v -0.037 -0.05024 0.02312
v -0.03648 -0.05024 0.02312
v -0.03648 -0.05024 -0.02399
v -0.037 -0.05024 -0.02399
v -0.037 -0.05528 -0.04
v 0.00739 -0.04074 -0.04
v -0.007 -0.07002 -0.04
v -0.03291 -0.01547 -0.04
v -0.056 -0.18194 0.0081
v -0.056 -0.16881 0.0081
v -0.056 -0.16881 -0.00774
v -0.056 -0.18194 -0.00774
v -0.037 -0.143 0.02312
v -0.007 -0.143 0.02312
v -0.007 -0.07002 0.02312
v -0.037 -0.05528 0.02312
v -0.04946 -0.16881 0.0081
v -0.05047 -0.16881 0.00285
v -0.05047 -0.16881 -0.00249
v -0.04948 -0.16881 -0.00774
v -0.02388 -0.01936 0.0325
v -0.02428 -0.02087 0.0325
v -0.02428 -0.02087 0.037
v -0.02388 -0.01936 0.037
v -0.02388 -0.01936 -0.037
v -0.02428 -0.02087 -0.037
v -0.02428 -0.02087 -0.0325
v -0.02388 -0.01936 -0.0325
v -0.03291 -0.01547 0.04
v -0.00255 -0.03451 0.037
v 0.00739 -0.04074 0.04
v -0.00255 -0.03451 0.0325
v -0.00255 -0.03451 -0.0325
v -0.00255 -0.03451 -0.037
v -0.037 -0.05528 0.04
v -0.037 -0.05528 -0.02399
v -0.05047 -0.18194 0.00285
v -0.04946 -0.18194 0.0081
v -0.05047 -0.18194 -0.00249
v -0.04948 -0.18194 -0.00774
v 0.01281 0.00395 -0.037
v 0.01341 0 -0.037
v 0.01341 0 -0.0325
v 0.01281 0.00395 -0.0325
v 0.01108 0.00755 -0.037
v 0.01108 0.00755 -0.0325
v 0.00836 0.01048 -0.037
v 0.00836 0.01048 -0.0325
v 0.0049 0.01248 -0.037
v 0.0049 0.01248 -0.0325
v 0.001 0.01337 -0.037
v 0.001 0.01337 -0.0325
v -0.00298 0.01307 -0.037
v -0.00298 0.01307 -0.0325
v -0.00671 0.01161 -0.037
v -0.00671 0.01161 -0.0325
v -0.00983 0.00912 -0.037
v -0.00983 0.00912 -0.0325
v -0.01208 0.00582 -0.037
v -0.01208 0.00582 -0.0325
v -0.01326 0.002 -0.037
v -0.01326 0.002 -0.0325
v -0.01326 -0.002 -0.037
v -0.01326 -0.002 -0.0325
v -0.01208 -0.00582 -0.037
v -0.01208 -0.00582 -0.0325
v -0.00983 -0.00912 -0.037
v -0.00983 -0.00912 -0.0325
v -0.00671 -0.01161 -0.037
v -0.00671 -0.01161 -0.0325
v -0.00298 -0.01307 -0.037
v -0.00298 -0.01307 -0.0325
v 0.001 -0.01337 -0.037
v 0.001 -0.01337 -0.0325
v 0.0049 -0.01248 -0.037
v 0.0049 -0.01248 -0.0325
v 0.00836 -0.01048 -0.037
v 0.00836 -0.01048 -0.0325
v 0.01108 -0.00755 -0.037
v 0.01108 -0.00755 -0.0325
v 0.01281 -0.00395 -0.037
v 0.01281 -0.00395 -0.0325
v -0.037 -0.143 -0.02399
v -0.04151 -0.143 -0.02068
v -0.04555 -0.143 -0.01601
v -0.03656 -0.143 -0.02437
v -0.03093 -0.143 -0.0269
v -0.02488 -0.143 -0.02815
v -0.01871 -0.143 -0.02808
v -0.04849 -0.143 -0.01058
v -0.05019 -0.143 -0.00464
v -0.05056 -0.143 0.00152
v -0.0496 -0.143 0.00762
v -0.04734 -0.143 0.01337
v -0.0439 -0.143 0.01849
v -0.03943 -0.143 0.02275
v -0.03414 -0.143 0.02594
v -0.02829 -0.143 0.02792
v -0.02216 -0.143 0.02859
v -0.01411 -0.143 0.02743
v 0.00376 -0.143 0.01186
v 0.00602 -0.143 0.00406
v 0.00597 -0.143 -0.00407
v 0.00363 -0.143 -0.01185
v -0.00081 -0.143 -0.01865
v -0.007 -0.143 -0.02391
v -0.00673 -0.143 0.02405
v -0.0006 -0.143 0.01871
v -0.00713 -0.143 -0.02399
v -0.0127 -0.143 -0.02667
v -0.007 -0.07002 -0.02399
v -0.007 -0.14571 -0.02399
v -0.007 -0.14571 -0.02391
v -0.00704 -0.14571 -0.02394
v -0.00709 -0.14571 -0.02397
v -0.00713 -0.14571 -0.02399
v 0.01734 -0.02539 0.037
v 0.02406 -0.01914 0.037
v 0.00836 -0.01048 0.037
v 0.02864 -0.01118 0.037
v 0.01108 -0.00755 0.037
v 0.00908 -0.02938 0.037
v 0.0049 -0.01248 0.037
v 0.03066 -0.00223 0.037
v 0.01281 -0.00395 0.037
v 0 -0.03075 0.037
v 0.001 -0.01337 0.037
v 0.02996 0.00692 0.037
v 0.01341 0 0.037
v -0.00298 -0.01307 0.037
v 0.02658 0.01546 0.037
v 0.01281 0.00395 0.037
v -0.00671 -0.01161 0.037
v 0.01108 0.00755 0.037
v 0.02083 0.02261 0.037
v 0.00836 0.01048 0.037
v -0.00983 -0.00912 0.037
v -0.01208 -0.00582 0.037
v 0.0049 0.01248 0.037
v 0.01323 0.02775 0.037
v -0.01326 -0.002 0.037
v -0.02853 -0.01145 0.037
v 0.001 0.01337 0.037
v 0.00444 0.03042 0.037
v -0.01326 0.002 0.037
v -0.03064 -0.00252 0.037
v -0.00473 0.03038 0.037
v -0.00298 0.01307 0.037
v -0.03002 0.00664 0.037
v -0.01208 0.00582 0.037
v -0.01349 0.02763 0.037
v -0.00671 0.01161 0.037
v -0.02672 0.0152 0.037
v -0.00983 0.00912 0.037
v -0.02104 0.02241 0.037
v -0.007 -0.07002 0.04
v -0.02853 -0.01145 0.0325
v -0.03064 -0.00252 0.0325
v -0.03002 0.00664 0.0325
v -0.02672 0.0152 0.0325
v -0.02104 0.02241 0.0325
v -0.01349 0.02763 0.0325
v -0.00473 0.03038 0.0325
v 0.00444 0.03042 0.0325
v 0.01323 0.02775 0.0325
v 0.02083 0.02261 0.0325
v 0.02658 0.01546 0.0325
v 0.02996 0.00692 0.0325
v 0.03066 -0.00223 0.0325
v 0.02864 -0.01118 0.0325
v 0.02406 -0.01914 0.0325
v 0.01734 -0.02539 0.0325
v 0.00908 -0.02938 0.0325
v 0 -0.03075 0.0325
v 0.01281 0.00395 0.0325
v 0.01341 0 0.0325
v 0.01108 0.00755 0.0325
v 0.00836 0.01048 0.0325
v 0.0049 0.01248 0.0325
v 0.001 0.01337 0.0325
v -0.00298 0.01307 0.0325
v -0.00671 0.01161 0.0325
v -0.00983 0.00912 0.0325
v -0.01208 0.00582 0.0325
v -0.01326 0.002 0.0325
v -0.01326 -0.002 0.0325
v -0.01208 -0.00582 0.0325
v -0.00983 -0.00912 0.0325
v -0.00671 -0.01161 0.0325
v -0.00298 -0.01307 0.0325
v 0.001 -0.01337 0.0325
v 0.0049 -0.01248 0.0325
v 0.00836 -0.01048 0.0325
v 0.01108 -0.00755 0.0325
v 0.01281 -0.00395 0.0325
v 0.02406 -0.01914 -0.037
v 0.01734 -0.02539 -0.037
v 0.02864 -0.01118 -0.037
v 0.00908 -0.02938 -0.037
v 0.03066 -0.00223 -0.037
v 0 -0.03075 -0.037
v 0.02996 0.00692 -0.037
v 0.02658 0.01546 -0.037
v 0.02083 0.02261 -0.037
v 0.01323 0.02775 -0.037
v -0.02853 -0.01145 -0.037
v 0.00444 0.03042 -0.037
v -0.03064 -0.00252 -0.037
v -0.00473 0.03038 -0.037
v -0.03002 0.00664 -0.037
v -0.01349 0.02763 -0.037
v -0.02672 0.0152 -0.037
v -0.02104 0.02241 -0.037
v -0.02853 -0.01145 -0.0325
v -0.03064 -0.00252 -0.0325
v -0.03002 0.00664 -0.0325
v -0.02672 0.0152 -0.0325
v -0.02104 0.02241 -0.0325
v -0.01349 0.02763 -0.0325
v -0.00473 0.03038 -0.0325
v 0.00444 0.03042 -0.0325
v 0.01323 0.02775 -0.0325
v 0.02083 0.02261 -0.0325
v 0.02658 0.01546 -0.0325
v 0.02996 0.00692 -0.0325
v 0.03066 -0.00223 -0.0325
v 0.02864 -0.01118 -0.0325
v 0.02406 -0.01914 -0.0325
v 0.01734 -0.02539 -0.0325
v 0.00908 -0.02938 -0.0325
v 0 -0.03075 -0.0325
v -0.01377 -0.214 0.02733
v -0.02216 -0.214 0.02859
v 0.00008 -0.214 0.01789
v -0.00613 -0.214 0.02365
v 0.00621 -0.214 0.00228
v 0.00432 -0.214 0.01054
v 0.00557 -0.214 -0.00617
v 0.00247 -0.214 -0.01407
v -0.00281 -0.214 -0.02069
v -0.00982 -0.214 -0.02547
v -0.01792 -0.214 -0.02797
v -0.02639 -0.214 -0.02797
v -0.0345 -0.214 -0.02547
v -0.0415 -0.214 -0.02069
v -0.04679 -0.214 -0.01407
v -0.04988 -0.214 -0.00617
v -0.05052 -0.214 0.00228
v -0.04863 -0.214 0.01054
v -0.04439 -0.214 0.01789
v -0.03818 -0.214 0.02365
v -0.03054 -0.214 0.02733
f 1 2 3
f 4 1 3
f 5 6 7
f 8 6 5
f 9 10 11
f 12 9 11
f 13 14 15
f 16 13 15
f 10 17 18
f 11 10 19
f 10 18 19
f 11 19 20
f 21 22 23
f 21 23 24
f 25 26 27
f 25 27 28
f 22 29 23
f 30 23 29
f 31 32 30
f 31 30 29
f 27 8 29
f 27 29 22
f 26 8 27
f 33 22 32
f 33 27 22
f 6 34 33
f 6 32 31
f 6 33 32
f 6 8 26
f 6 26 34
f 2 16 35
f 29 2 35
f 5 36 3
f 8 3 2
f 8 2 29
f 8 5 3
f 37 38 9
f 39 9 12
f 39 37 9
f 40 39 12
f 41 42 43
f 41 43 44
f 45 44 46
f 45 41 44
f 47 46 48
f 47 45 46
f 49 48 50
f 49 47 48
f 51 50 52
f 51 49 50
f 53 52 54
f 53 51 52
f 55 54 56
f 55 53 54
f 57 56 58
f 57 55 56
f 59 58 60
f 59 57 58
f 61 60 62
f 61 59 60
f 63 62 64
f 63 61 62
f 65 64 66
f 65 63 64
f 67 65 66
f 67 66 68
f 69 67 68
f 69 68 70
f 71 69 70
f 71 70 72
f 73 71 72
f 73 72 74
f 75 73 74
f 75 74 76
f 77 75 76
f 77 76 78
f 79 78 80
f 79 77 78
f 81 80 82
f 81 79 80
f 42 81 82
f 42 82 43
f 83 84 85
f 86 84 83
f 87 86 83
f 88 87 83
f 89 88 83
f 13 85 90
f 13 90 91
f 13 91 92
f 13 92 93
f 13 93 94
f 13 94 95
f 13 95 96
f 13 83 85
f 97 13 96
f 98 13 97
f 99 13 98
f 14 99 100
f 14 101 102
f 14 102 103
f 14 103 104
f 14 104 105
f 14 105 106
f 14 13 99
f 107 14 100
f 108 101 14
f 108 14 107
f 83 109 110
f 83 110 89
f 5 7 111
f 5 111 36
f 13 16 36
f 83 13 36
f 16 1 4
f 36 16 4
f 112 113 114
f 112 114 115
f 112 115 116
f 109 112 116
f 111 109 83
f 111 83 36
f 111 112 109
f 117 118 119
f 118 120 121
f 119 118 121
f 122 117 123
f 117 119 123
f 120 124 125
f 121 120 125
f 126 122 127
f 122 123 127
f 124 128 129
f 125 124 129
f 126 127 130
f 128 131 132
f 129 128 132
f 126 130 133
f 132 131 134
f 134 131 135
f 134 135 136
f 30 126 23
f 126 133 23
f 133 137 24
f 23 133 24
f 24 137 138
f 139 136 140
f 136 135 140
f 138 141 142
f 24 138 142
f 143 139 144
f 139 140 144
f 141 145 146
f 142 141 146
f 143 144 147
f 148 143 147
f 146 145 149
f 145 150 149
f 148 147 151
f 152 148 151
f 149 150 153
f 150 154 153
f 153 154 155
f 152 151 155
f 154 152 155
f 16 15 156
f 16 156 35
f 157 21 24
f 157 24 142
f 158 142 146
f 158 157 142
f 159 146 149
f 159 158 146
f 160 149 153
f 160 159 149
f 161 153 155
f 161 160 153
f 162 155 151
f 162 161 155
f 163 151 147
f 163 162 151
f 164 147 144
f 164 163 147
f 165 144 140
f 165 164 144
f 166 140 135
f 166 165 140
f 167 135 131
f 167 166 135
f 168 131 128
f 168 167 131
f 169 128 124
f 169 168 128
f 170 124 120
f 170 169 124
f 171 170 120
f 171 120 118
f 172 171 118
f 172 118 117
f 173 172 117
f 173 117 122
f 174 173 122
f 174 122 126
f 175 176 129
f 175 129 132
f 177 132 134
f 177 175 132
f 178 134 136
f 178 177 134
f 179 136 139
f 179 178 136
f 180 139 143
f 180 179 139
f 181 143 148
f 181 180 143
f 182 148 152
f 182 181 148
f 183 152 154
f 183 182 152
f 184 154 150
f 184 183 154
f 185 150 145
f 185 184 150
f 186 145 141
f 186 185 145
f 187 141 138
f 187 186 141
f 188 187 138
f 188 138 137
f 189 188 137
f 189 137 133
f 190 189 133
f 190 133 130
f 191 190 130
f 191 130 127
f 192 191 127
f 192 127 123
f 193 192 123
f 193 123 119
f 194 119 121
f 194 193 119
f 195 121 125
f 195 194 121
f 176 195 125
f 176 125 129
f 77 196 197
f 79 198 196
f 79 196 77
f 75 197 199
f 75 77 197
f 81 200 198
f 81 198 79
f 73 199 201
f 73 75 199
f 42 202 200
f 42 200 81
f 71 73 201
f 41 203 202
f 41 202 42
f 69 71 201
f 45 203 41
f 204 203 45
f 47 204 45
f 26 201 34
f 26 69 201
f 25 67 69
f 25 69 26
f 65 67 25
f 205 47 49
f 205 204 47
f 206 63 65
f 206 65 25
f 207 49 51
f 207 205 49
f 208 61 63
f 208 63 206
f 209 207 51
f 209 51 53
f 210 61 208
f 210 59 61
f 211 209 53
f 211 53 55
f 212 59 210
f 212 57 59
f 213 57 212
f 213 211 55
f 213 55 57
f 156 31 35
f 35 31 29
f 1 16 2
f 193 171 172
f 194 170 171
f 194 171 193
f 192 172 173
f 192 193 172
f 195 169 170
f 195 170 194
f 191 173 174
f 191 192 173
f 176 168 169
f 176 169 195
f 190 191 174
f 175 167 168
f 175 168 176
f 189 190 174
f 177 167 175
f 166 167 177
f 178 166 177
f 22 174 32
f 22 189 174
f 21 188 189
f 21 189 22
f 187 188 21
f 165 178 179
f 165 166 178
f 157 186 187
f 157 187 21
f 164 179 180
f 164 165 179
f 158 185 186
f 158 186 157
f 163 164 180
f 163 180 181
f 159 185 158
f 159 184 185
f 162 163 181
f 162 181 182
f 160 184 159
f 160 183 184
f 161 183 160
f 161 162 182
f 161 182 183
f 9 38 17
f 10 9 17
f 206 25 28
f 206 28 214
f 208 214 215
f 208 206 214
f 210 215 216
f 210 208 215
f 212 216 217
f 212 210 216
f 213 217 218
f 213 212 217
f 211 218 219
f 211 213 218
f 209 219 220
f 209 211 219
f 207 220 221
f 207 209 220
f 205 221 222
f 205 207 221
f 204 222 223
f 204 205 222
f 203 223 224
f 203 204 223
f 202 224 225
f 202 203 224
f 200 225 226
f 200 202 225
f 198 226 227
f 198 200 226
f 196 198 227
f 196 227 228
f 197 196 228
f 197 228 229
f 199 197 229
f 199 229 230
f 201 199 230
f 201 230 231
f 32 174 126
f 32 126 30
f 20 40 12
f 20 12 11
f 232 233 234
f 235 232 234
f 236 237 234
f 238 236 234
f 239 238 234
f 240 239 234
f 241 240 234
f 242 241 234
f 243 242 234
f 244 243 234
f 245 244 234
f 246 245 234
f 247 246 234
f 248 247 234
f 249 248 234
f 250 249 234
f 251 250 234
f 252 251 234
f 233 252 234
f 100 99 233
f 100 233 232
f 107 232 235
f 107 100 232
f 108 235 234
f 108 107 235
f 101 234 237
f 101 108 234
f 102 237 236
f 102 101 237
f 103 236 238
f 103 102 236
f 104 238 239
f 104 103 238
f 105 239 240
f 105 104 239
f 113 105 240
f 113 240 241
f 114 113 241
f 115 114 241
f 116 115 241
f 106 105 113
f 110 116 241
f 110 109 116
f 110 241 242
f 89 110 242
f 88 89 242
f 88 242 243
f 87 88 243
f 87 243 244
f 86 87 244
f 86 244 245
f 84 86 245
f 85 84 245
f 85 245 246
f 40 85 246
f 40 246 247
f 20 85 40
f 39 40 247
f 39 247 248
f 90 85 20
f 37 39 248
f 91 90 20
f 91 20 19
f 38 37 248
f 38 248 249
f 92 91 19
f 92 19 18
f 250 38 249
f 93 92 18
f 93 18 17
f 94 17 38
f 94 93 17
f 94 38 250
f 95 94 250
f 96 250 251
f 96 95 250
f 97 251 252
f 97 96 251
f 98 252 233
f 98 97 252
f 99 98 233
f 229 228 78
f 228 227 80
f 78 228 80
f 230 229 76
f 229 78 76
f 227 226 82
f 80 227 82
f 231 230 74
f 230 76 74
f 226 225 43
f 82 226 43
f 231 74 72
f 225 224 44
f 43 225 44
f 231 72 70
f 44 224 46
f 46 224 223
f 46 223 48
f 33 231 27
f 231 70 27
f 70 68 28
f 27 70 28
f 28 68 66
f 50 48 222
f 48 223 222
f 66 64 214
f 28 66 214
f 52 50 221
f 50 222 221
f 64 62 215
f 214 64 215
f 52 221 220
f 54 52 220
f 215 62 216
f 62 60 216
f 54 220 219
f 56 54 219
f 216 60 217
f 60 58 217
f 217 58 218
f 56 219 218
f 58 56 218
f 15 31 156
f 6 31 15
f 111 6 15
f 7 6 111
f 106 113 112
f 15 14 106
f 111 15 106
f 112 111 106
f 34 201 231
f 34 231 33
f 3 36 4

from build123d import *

# Parameters (mm, degrees)
BOSS_EXTRUDE1_START      = -0.143
SKETCH1_R                = 0.028440267
BOSS_EXTRUDE1_DEPTH      = 0.071
SKETCH2_W                = 0.015839442
SKETCH2_H                = 0.013131845
BOSS_EXTRUDE2_DEPTH      = 0.056
BOSS_EXTRUDE3_START      = -0.007
SKETCH3_W                = 0.047113502
SKETCH3_H                = 0.095471257
BOSS_EXTRUDE3_DEPTH      = 0.03
BOSS_EXTRUDE4_DEPTH      = 0.04
BOSS_EXTRUDE4_DEPTH_BACK = 0.04
BOSS_EXTRUDE5_START      = 0.0325
SKETCH6_R                = 0.013410772
BOSS_EXTRUDE5_DEPTH      = 0.0045
BOSS_EXTRUDE6_START      = -0.037
SKETCH6_3_R              = 0.013410772
BOSS_EXTRUDE6_DEPTH      = 0.0045


with BuildPart() as part:
    # Sketch1 → Boss-Extrude1 (new body)
    with BuildSketch(Plane(origin=(0, 0, 0), x_dir=(1, 0, 0), z_dir=(0, 1, 0)).offset(BOSS_EXTRUDE1_START)):
        with Locations((-0.022155362, -0.000154163)):
            Circle(SKETCH1_R)
    extrude(amount=-BOSS_EXTRUDE1_DEPTH)

    # Sketch2 → Boss-Extrude2 (add)
    with BuildSketch(Plane(origin=(0, 0, 0), x_dir=(0, 0, -1), z_dir=(1, 0, 0))):
        with Locations((-0.000180717, -0.175372091)):
            Rectangle(SKETCH2_W, SKETCH2_H)
    extrude(amount=-BOSS_EXTRUDE2_DEPTH)

    # Sketch3 → Boss-Extrude3 (add)
    with BuildSketch(Plane(origin=(0, 0, 0), x_dir=(0, 0, -1), z_dir=(1, 0, 0)).offset(BOSS_EXTRUDE3_START)):
        with Locations((0.000437164, -0.097977702)):
            Rectangle(SKETCH3_W, SKETCH3_H)
    extrude(amount=-BOSS_EXTRUDE3_DEPTH)

    # Sketch4 → Boss-Extrude4 (add, two sides: drawn at the far end of the back side and taken through both)
    with BuildSketch(Plane.XY.offset(-BOSS_EXTRUDE4_DEPTH_BACK)):
        Polygon((0.007393718, -0.040743365), (-0.007, -0.070024242), (-0.037, -0.055277022), (-0.032908503, -0.01546525), align=None)
    extrude(amount=BOSS_EXTRUDE4_DEPTH + BOSS_EXTRUDE4_DEPTH_BACK)

    # Sketch6 → Boss-Extrude5 (add)
    with BuildSketch(Plane.XY.offset(BOSS_EXTRUDE5_START)):
        with BuildLine():
            Line((-0.024284044, -0.020874631), (-0.023880316, -0.019364786))
            ThreePointArc((-0.023880316, -0.019364786), (0.013226699, 0.027754618), (0, -0.030745152))
            Line((0, -0.030745152), (-0.002547697, -0.034507971))
            Line((-0.002547697, -0.034507971), (-0.024284044, -0.020874631))
        make_face()
        Circle(SKETCH6_R, mode=Mode.SUBTRACT)
    extrude(amount=BOSS_EXTRUDE5_DEPTH)

    # Sketch6<3> → Boss-Extrude6 (add)
    with BuildSketch(Plane.XY.offset(BOSS_EXTRUDE6_START)):
        with BuildLine():
            Line((-0.024284044, -0.020874631), (-0.023880316, -0.019364786))
            ThreePointArc((-0.023880316, -0.019364786), (0.013226699, 0.027754618), (0, -0.030745152))
            Line((0, -0.030745152), (-0.002547697, -0.034507971))
            Line((-0.002547697, -0.034507971), (-0.024284044, -0.020874631))
        make_face()
        Circle(SKETCH6_3_R, mode=Mode.SUBTRACT)
    extrude(amount=BOSS_EXTRUDE6_DEPTH)


solid = part.part
